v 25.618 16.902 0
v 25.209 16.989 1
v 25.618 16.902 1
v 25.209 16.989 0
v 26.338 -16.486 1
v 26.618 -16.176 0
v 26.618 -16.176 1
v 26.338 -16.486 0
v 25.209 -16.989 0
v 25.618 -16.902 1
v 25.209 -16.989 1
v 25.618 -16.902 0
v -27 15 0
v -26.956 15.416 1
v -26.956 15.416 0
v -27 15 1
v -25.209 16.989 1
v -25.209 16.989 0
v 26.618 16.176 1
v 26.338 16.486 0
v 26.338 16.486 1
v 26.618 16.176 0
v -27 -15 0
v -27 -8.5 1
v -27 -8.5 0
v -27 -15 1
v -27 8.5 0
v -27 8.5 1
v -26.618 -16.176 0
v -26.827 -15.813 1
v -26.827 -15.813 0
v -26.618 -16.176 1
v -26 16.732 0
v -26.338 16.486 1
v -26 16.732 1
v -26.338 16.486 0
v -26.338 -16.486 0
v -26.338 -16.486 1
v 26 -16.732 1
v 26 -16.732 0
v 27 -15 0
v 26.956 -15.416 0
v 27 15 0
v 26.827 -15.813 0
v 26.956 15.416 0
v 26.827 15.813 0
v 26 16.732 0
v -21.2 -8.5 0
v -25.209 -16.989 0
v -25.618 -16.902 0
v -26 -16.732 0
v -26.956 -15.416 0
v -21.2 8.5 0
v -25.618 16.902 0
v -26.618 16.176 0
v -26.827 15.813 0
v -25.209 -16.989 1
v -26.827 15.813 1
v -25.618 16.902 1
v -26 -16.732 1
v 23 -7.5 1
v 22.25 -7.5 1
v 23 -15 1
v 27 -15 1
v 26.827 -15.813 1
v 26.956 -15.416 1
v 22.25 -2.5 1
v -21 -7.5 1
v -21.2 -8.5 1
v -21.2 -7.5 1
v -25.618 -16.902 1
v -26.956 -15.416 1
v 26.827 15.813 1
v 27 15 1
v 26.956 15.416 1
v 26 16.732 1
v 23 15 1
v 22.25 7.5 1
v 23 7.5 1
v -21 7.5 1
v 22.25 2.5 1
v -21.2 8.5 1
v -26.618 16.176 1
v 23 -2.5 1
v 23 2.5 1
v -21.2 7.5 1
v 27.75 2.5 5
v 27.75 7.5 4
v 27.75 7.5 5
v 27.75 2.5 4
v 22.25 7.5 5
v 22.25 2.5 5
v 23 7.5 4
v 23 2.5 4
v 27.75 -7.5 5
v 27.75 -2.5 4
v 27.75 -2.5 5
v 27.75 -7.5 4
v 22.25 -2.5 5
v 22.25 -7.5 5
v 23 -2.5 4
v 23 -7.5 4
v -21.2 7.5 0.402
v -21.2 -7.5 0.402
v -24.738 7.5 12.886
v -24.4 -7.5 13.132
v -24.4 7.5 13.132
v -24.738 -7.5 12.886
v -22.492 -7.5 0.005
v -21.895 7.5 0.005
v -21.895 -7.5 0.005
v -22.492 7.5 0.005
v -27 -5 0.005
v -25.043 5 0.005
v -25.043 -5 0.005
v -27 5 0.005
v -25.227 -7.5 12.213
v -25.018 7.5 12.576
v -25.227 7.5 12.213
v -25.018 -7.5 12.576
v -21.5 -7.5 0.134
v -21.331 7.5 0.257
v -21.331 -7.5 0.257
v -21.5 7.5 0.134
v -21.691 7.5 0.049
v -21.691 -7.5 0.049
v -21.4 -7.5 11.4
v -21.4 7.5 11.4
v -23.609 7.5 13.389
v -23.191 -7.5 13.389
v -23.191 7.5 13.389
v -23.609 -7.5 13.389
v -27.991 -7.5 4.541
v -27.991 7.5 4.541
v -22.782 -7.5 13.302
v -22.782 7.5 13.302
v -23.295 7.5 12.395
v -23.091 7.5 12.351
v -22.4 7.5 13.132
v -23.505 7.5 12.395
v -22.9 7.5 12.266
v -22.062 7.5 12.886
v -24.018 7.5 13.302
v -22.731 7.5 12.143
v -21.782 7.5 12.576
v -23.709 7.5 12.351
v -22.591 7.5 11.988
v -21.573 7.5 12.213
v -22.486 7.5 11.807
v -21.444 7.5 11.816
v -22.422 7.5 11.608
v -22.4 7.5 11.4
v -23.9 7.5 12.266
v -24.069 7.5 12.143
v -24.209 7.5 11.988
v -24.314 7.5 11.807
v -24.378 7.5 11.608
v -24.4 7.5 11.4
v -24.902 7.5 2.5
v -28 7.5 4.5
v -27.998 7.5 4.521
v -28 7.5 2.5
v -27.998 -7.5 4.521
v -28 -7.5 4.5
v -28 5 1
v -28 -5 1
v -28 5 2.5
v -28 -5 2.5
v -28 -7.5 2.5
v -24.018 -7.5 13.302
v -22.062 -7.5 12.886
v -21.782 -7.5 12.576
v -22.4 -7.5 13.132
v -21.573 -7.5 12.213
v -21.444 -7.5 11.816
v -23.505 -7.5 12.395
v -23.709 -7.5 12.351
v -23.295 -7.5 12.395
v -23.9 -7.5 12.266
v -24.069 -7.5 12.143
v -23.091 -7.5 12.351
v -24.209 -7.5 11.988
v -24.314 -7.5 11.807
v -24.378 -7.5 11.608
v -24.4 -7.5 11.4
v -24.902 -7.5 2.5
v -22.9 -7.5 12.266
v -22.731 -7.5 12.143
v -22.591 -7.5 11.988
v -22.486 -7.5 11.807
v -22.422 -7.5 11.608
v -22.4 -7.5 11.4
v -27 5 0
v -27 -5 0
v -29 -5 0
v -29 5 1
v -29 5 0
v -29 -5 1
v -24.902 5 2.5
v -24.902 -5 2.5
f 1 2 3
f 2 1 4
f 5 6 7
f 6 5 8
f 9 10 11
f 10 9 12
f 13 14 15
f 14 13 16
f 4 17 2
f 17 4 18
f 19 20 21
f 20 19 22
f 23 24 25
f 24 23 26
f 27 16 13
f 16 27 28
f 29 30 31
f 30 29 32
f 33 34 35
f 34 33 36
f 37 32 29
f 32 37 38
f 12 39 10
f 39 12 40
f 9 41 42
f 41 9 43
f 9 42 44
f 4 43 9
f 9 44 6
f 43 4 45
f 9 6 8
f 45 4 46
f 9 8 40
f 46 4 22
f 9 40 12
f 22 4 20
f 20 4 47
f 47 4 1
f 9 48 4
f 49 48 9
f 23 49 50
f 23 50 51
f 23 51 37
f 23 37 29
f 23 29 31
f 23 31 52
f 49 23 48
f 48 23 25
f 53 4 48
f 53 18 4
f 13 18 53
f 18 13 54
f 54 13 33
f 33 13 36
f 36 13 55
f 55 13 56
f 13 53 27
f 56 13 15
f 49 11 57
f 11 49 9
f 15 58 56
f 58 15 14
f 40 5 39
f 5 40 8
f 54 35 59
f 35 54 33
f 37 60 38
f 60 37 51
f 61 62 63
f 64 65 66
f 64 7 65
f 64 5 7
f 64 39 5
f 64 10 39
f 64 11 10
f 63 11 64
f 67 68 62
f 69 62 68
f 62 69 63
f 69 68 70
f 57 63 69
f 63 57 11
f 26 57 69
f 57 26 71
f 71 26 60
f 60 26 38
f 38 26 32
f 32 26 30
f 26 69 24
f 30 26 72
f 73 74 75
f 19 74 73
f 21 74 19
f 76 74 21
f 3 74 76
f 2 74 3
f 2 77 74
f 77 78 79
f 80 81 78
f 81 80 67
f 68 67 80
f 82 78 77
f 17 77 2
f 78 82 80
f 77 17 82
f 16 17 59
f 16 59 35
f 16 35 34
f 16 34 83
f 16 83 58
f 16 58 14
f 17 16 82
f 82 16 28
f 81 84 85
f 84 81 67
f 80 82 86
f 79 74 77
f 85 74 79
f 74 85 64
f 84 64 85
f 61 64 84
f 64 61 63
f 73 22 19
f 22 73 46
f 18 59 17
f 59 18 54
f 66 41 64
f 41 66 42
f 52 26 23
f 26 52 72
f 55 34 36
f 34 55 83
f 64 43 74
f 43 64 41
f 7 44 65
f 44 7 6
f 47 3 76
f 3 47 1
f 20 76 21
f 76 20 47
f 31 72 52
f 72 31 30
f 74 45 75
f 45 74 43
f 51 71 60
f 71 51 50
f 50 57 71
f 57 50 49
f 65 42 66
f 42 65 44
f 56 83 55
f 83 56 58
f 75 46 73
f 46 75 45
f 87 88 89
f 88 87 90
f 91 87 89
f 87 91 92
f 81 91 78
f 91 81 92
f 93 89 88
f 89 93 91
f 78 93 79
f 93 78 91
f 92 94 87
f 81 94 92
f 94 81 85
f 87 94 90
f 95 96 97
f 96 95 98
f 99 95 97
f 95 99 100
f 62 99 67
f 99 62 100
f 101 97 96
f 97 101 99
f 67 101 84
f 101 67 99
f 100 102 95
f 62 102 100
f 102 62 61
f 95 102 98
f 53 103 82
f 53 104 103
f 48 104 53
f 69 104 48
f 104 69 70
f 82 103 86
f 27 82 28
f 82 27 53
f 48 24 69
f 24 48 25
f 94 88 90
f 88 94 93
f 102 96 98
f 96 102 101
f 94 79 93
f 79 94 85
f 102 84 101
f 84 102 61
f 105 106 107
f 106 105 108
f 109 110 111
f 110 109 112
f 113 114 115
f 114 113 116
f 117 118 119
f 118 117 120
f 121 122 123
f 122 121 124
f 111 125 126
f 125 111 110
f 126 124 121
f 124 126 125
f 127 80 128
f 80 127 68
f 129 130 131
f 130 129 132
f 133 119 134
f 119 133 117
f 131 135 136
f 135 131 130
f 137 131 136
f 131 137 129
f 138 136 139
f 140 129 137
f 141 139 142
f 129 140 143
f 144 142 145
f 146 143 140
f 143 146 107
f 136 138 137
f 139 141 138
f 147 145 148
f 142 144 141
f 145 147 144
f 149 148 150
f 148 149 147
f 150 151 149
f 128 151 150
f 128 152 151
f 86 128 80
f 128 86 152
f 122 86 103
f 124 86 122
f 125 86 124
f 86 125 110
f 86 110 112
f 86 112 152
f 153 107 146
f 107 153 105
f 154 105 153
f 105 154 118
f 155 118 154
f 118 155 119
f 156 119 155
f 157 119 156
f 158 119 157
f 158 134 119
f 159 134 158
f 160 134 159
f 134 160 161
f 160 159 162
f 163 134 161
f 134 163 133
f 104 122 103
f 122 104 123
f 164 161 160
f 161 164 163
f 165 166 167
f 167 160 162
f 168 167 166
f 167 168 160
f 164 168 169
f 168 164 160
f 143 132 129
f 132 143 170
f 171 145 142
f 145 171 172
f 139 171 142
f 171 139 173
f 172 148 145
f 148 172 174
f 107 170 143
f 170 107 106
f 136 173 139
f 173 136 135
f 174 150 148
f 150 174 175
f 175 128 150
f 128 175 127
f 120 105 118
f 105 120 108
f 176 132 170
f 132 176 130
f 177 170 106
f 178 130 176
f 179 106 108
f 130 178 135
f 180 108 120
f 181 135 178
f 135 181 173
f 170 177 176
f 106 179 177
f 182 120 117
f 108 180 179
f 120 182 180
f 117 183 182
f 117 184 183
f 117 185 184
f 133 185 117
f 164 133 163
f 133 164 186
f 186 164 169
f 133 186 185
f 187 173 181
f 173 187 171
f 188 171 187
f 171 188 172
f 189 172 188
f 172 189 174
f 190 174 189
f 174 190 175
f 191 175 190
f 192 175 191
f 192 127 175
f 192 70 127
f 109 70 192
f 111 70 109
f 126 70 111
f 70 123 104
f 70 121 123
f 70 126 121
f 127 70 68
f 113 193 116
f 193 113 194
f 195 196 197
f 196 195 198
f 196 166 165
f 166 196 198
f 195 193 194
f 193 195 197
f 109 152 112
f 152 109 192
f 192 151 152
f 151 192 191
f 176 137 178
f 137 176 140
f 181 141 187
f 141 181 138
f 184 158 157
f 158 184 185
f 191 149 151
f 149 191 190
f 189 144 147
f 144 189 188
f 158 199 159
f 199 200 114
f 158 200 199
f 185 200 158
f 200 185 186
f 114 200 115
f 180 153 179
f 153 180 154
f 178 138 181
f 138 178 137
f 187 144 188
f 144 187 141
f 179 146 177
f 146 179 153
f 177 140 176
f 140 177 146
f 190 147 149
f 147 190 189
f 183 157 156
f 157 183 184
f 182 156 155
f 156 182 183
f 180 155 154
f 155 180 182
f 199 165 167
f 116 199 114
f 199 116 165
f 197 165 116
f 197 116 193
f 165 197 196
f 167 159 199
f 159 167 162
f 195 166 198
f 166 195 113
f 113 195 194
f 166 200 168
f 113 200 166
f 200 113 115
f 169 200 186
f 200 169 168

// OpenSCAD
// This generates custom battery covers
// Licenced under Creative Commons: Attribution, Share-Alike
//		http://creativecommons.org/licenses/by-sa/3.0/
// For attribution you can direct people to the original file on thingiverse:
// 		http://www.thingiverse.com/thing:243269

// ================ variables

//CUSTOMIZER VARIABLES

/* [Basic] */

// how long the battery cover is.  (This dimension is in the clip-to-ears direction.)
length=50; // 10:200

// how wide the battery cover is
width=30; // 10:200

// how thick the battery cover is
thickness=0.5;  // 0.1:10

// radius for rounding over the corners of the battery cover
corner_radius=2;  // 0:10

// how thick the case plastic is
case_thickness=3.5;

/* [Ears] */

// how wide the ear tabs are
ear_width=5;  // 2:25

// how wide the ear tabs are
ear_length=5;  // 2:25

// how far apart the ear tabs are.  (To create one wide tab, just set this to 0.)
ear_spacing=10;  // 1:100

// How thick the case is where the ears attach.  Usually it should be the same as "thickness" on the "basic" tab
ear_case_thickness=3.5;  // 0.1:10

/* [Clip] */

// How wide the clip is
clip_width=15; // 5:50

// How deep the clip is
clip_length=5.8; // 5.8

// This is used for a side-engagement clip.  Most clips are this way now.  It measures how wide the small part of the clip is.
clip_width_sides=10;

// This is for a front-engagement clip.  If unused, set it to 0, otherwise, how long the catch will be (usually about 2-3mm)
clip_length_catch=1;

// How far the clip is in/out relative to the edge of the battery cover.
//clip_indent=0;  // -15:15

// This is how far down into the battery case the clip engages.  Usually it should be the same as "thickness" on the "basic" tab
clip_case_thickness=3.5;  // 0.1:10

// The thickness of the finger tab
tab_thickness=1;

/* [Gussets] */

// Which direction the support gussets go
gusset_orientation=0; // [0:clip_lengthwise,1:clip_widthwise]

// How thick the gussets are (set to 0 to turn off gussets)
gusset_thickness=0;

// How high the gussets are
gusset_height=0;

// How far apart the gussets are
gusset_spacing=0;

/* [Advanced] */

// Resolution
$fn=30;

// end variables

cover(width,length,thickness,case_thickness,gusset_thickness,corner_radius,ear_width,ear_spacing,clip_width,clip_width_sides,clip_length,clip_length_catch,clip_case_thickness,ear_length,tab_thickness);

module clip(clip_width=15,clip_width_sides=10,clip_length=1,clip_case_thickness=5,clip_length_catch=3,tab_thickness=3) {
	rotate([90,0,0]){
		difference () {
			union(){ // the outside shape
				hull () {
					translate([0,0,0]) cylinder(r=1,h=clip_width); // outside radius
					translate([5,0,0]) cylinder(r=1,h=clip_width); // inside fadius
					translate([3.6,10.4,0]) cylinder(r=2,h=clip_width); // top
					if(clip_length_catch>0){
						translate([-clip_length_catch+0.1,clip_case_thickness,0]) cylinder(r=0.1,h=clip_width); // add a front overhang
					}
				}
				translate([-2,-1,0]) cube([2,tab_thickness,clip_width]); // the overlap tab
			}
			union(){ // The inside void
				hull() { 
					translate([3.6,10.4,0]) cylinder(r=1,h=clip_width);
					translate([3.5,-2,0]) cylinder(r=1,h=clip_width);
					translate([2.9,-2,0]) cylinder(r=1,h=clip_width);
				}
				//translate([-tab_thickness,0,0]) cube([3,clip_case_thickness,clip_width]); // trim off outside
				translate([-2,-2,0]) cube([5,clip_case_thickness,(clip_width-clip_width_sides)/2]); // trim off left side
				translate([-2,-2,clip_width-(clip_width-clip_width_sides)/2]) cube([5,clip_case_thickness,(clip_width-clip_width_sides)/2]); // trim off right side
			}
		}
	}
}

module cover(width=30,length=60,thickness=0.5,case_thickness=3.9,gusset_thickness=4.5,corner_radius=1,ear_width=7.5,ear_spacing=29,clip_width=15,clip_width_sides=10,clip_length=1,clip_length_catch=3,clip_case_thickness=5,ear_length=5.8,tab_thickness=3) {
	difference(){
		// the base shape
		union(){
			// the face
			translate([-length/2,-width/2,0]) 
			minkowski(){
				cube([length,width,thickness]);
				if(corner_radius>0) cylinder(r=corner_radius,h=thickness);
			}
			// gussets
			translate([8.1,0,0]) cube([54.8,1.6,gusset_thickness]);
			translate([8.1,64.4,0]) cube([54.8,1.6,gusset_thickness]);
			// the ears
			translate([(length-ear_length-thickness)/2,(ear_spacing/2)-(ear_width/2),thickness*2]) cube([ear_length+thickness,ear_width,case_thickness+thickness]);
			translate([(length-ear_length-thickness)/2,(-ear_spacing/2)+(-ear_width/2),thickness*2]) cube([ear_length+thickness,ear_width,case_thickness+thickness]);
		}
		union(){
			translate([(-length/2)-corner_radius,-clip_width/2-1,0]) cube([clip_length,clip_width+2,thickness*2]); // the hole for the clip
			translate([(length-ear_length)/2+thickness,-width/2,thickness*2]) cube([30,width,case_thickness-thickness]); // ear notch 
		}
	}
	// the clip itsself
	translate([(-length/2)-corner_radius,clip_width/2,1]) clip(clip_width,clip_width_sides,clip_length,clip_case_thickness,clip_length_catch,tab_thickness);
}
